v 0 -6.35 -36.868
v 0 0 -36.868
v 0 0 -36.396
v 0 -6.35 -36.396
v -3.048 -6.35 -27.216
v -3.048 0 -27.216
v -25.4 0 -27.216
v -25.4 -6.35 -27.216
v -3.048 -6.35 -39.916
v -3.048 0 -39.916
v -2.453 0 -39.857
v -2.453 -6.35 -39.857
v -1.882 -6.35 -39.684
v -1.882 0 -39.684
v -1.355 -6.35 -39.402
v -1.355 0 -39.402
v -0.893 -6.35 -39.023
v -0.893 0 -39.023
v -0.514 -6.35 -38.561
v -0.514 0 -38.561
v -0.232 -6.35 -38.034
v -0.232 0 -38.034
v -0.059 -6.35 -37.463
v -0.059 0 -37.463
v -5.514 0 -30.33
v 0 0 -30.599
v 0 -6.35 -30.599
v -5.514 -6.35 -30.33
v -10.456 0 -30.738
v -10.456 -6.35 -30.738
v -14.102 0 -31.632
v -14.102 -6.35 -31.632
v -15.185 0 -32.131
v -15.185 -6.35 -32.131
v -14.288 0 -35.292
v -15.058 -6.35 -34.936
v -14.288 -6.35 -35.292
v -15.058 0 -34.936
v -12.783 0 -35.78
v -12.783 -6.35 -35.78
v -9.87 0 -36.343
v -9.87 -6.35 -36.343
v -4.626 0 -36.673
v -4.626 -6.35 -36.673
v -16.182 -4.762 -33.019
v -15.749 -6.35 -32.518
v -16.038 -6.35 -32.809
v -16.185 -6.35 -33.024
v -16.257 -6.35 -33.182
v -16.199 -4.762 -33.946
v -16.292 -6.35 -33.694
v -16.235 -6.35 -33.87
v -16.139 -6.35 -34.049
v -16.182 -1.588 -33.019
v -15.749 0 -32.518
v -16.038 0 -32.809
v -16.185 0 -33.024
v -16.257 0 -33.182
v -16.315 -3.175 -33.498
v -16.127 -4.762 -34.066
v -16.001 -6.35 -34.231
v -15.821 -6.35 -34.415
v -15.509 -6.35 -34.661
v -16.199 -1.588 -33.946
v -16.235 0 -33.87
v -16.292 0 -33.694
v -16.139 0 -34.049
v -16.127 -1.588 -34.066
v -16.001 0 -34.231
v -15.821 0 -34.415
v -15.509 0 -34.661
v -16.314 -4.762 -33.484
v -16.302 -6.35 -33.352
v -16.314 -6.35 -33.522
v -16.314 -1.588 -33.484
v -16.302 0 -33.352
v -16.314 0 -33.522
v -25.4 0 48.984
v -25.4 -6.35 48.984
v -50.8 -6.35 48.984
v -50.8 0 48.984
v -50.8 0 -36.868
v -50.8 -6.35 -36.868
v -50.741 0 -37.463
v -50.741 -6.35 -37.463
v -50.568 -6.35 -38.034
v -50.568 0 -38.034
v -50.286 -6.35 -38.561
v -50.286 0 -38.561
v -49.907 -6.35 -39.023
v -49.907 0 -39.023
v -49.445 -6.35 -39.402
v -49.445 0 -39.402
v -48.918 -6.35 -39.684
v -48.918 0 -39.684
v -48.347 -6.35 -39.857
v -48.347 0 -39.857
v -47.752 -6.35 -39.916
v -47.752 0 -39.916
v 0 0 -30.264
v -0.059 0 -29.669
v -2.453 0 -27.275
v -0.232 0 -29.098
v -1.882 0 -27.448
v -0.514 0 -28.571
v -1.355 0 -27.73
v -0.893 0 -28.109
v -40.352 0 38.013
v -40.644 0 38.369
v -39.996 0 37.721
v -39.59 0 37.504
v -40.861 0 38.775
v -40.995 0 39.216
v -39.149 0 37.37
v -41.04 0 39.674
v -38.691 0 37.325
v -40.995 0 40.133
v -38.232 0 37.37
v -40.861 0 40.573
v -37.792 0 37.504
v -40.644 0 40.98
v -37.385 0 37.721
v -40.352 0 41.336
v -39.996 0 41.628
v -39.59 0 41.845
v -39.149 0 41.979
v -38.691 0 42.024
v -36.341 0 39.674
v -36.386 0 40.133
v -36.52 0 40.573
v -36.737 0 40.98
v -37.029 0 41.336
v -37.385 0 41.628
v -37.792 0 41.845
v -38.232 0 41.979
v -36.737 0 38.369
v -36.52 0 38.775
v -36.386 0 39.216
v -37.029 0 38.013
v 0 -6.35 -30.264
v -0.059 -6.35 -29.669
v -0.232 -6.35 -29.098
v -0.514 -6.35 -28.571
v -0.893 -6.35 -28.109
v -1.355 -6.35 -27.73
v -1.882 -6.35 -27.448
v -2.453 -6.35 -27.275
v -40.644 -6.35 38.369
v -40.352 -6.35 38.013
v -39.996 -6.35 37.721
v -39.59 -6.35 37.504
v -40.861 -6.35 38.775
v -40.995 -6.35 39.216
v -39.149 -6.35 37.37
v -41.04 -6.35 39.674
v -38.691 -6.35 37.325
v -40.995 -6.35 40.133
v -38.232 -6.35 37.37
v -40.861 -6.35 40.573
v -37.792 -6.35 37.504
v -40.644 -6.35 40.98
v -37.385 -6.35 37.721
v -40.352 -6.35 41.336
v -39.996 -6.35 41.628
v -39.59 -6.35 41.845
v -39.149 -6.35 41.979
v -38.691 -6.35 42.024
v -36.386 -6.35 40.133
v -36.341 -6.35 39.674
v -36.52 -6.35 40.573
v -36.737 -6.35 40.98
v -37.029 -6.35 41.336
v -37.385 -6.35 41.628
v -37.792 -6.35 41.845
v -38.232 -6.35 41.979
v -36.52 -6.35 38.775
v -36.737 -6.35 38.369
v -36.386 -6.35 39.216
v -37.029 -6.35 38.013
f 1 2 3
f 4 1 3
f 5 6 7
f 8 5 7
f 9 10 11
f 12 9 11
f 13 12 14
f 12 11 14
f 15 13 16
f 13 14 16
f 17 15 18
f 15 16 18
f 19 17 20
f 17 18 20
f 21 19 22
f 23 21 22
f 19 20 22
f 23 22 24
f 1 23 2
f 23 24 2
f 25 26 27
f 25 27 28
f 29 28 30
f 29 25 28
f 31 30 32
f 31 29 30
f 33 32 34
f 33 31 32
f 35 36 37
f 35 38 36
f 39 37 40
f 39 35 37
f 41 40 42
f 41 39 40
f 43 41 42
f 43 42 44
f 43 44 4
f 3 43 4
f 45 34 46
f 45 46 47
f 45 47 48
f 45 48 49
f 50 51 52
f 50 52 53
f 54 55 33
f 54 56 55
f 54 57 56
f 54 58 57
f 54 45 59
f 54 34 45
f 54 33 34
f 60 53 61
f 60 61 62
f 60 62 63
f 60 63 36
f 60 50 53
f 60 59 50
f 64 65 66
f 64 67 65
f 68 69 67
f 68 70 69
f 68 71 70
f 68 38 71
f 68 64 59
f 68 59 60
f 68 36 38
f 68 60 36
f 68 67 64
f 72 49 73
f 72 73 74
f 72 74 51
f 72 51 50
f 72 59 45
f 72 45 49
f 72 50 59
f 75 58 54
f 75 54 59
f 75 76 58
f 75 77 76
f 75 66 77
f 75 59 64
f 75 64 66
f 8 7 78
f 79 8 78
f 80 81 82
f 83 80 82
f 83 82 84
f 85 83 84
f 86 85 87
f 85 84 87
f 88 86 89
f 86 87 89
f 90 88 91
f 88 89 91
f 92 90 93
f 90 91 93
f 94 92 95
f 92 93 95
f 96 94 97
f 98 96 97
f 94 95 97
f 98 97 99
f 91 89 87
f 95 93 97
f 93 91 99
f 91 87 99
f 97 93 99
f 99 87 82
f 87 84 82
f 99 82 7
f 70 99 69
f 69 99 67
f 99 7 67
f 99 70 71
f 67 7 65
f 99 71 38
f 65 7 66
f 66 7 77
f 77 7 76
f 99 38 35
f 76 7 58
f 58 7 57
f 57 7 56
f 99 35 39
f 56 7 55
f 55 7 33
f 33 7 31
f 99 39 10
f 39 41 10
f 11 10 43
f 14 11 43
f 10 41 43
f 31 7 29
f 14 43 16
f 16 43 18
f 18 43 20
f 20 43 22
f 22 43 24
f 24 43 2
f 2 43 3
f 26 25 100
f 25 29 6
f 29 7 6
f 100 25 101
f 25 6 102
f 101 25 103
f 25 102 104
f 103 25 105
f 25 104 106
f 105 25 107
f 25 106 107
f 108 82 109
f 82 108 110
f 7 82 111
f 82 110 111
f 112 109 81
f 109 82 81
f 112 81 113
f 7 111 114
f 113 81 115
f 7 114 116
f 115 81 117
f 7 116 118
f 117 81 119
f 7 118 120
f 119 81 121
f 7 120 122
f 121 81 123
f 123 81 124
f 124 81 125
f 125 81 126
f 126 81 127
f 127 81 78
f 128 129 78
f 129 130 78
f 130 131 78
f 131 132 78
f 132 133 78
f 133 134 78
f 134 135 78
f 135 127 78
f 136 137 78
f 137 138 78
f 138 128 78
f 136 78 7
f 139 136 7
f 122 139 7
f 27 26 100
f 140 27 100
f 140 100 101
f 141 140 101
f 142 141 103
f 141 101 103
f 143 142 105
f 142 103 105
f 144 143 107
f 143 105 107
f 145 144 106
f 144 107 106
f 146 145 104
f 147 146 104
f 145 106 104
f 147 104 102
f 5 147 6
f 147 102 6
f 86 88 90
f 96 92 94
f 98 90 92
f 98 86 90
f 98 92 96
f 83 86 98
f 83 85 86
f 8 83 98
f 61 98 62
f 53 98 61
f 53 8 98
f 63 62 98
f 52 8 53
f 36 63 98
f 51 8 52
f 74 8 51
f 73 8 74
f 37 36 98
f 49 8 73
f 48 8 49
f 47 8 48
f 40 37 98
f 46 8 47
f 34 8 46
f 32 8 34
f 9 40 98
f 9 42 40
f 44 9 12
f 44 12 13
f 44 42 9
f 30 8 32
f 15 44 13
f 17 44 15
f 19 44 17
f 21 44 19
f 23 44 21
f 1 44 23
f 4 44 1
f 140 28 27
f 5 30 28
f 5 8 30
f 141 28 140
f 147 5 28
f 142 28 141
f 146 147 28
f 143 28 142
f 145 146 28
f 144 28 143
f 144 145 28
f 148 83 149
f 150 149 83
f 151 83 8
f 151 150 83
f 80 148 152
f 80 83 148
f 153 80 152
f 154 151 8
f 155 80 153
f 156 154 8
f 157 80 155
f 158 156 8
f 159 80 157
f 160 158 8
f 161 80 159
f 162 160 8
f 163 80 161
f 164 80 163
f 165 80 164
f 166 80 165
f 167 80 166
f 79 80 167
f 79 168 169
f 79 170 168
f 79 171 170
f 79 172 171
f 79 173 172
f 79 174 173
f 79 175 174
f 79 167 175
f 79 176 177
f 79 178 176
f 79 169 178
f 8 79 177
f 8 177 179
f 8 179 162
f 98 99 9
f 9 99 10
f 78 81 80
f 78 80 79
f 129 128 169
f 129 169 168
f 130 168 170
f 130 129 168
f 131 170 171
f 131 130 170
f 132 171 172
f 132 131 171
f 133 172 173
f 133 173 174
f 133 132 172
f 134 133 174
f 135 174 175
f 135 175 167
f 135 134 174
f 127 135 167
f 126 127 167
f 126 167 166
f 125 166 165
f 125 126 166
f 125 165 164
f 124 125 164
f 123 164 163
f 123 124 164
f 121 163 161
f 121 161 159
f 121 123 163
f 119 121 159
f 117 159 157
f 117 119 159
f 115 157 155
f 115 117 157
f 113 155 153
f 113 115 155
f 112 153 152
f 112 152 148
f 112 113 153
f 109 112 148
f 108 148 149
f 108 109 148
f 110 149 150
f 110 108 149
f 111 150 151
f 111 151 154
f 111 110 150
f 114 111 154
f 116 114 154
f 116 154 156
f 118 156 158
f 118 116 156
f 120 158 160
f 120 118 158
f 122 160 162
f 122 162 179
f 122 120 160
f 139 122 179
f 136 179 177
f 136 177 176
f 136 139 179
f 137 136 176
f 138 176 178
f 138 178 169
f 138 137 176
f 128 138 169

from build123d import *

# Parameters (mm, degrees)
F0_W     = 25.4
F0_H     = 76.2
F0_R     = 2.3495
F1_DEPTH = 6.35


with BuildPart() as f1:
    # F0 (on Front) → F1 (new body)
    with BuildSketch(Plane.XZ):
        with Locations((-38.1, 10.883943)):
            Rectangle(F0_W, F0_H)
        with Locations((-38.690675, 39.674234)):
            Circle(F0_R, mode=Mode.SUBTRACT)
        with BuildLine():
            Line((-25.4, -27.216057), (-50.8, -27.216057))
            Line((-50.8, -27.216057), (-50.8, -36.868057))
            ThreePointArc((-50.8, -36.868057), (-49.907261, -39.023318), (-47.752, -39.916057))
            Line((-47.752, -39.916057), (-3.048, -39.916057))
            ThreePointArc((-3.048, -39.916057), (-0.892739, -39.023318), (0, -36.868057))
            Line((0, -36.868057), (0, -36.396314))
            add(Edge.make_bspline(
                [(0, -30.599461), (-16.314539, -28.600201), (-16.314539, -33.497887), (-16.314539, -38.395574), (0, -36.396314)],
                knots=[1.150309, 1.150309, 1.150309, 3.141593, 3.141593, 5.132876, 5.132876, 5.132876], degree=2, weights=[1, 0.543965, 1, 0.543965, 1]))
            Line((0, -30.599461), (0, -30.264057))
            ThreePointArc((0, -30.264057), (-0.892739, -28.108795), (-3.048, -27.216057))
            Line((-3.048, -27.216057), (-25.4, -27.216057))
        make_face()
    extrude(amount=F1_DEPTH)


solid = f1.part
